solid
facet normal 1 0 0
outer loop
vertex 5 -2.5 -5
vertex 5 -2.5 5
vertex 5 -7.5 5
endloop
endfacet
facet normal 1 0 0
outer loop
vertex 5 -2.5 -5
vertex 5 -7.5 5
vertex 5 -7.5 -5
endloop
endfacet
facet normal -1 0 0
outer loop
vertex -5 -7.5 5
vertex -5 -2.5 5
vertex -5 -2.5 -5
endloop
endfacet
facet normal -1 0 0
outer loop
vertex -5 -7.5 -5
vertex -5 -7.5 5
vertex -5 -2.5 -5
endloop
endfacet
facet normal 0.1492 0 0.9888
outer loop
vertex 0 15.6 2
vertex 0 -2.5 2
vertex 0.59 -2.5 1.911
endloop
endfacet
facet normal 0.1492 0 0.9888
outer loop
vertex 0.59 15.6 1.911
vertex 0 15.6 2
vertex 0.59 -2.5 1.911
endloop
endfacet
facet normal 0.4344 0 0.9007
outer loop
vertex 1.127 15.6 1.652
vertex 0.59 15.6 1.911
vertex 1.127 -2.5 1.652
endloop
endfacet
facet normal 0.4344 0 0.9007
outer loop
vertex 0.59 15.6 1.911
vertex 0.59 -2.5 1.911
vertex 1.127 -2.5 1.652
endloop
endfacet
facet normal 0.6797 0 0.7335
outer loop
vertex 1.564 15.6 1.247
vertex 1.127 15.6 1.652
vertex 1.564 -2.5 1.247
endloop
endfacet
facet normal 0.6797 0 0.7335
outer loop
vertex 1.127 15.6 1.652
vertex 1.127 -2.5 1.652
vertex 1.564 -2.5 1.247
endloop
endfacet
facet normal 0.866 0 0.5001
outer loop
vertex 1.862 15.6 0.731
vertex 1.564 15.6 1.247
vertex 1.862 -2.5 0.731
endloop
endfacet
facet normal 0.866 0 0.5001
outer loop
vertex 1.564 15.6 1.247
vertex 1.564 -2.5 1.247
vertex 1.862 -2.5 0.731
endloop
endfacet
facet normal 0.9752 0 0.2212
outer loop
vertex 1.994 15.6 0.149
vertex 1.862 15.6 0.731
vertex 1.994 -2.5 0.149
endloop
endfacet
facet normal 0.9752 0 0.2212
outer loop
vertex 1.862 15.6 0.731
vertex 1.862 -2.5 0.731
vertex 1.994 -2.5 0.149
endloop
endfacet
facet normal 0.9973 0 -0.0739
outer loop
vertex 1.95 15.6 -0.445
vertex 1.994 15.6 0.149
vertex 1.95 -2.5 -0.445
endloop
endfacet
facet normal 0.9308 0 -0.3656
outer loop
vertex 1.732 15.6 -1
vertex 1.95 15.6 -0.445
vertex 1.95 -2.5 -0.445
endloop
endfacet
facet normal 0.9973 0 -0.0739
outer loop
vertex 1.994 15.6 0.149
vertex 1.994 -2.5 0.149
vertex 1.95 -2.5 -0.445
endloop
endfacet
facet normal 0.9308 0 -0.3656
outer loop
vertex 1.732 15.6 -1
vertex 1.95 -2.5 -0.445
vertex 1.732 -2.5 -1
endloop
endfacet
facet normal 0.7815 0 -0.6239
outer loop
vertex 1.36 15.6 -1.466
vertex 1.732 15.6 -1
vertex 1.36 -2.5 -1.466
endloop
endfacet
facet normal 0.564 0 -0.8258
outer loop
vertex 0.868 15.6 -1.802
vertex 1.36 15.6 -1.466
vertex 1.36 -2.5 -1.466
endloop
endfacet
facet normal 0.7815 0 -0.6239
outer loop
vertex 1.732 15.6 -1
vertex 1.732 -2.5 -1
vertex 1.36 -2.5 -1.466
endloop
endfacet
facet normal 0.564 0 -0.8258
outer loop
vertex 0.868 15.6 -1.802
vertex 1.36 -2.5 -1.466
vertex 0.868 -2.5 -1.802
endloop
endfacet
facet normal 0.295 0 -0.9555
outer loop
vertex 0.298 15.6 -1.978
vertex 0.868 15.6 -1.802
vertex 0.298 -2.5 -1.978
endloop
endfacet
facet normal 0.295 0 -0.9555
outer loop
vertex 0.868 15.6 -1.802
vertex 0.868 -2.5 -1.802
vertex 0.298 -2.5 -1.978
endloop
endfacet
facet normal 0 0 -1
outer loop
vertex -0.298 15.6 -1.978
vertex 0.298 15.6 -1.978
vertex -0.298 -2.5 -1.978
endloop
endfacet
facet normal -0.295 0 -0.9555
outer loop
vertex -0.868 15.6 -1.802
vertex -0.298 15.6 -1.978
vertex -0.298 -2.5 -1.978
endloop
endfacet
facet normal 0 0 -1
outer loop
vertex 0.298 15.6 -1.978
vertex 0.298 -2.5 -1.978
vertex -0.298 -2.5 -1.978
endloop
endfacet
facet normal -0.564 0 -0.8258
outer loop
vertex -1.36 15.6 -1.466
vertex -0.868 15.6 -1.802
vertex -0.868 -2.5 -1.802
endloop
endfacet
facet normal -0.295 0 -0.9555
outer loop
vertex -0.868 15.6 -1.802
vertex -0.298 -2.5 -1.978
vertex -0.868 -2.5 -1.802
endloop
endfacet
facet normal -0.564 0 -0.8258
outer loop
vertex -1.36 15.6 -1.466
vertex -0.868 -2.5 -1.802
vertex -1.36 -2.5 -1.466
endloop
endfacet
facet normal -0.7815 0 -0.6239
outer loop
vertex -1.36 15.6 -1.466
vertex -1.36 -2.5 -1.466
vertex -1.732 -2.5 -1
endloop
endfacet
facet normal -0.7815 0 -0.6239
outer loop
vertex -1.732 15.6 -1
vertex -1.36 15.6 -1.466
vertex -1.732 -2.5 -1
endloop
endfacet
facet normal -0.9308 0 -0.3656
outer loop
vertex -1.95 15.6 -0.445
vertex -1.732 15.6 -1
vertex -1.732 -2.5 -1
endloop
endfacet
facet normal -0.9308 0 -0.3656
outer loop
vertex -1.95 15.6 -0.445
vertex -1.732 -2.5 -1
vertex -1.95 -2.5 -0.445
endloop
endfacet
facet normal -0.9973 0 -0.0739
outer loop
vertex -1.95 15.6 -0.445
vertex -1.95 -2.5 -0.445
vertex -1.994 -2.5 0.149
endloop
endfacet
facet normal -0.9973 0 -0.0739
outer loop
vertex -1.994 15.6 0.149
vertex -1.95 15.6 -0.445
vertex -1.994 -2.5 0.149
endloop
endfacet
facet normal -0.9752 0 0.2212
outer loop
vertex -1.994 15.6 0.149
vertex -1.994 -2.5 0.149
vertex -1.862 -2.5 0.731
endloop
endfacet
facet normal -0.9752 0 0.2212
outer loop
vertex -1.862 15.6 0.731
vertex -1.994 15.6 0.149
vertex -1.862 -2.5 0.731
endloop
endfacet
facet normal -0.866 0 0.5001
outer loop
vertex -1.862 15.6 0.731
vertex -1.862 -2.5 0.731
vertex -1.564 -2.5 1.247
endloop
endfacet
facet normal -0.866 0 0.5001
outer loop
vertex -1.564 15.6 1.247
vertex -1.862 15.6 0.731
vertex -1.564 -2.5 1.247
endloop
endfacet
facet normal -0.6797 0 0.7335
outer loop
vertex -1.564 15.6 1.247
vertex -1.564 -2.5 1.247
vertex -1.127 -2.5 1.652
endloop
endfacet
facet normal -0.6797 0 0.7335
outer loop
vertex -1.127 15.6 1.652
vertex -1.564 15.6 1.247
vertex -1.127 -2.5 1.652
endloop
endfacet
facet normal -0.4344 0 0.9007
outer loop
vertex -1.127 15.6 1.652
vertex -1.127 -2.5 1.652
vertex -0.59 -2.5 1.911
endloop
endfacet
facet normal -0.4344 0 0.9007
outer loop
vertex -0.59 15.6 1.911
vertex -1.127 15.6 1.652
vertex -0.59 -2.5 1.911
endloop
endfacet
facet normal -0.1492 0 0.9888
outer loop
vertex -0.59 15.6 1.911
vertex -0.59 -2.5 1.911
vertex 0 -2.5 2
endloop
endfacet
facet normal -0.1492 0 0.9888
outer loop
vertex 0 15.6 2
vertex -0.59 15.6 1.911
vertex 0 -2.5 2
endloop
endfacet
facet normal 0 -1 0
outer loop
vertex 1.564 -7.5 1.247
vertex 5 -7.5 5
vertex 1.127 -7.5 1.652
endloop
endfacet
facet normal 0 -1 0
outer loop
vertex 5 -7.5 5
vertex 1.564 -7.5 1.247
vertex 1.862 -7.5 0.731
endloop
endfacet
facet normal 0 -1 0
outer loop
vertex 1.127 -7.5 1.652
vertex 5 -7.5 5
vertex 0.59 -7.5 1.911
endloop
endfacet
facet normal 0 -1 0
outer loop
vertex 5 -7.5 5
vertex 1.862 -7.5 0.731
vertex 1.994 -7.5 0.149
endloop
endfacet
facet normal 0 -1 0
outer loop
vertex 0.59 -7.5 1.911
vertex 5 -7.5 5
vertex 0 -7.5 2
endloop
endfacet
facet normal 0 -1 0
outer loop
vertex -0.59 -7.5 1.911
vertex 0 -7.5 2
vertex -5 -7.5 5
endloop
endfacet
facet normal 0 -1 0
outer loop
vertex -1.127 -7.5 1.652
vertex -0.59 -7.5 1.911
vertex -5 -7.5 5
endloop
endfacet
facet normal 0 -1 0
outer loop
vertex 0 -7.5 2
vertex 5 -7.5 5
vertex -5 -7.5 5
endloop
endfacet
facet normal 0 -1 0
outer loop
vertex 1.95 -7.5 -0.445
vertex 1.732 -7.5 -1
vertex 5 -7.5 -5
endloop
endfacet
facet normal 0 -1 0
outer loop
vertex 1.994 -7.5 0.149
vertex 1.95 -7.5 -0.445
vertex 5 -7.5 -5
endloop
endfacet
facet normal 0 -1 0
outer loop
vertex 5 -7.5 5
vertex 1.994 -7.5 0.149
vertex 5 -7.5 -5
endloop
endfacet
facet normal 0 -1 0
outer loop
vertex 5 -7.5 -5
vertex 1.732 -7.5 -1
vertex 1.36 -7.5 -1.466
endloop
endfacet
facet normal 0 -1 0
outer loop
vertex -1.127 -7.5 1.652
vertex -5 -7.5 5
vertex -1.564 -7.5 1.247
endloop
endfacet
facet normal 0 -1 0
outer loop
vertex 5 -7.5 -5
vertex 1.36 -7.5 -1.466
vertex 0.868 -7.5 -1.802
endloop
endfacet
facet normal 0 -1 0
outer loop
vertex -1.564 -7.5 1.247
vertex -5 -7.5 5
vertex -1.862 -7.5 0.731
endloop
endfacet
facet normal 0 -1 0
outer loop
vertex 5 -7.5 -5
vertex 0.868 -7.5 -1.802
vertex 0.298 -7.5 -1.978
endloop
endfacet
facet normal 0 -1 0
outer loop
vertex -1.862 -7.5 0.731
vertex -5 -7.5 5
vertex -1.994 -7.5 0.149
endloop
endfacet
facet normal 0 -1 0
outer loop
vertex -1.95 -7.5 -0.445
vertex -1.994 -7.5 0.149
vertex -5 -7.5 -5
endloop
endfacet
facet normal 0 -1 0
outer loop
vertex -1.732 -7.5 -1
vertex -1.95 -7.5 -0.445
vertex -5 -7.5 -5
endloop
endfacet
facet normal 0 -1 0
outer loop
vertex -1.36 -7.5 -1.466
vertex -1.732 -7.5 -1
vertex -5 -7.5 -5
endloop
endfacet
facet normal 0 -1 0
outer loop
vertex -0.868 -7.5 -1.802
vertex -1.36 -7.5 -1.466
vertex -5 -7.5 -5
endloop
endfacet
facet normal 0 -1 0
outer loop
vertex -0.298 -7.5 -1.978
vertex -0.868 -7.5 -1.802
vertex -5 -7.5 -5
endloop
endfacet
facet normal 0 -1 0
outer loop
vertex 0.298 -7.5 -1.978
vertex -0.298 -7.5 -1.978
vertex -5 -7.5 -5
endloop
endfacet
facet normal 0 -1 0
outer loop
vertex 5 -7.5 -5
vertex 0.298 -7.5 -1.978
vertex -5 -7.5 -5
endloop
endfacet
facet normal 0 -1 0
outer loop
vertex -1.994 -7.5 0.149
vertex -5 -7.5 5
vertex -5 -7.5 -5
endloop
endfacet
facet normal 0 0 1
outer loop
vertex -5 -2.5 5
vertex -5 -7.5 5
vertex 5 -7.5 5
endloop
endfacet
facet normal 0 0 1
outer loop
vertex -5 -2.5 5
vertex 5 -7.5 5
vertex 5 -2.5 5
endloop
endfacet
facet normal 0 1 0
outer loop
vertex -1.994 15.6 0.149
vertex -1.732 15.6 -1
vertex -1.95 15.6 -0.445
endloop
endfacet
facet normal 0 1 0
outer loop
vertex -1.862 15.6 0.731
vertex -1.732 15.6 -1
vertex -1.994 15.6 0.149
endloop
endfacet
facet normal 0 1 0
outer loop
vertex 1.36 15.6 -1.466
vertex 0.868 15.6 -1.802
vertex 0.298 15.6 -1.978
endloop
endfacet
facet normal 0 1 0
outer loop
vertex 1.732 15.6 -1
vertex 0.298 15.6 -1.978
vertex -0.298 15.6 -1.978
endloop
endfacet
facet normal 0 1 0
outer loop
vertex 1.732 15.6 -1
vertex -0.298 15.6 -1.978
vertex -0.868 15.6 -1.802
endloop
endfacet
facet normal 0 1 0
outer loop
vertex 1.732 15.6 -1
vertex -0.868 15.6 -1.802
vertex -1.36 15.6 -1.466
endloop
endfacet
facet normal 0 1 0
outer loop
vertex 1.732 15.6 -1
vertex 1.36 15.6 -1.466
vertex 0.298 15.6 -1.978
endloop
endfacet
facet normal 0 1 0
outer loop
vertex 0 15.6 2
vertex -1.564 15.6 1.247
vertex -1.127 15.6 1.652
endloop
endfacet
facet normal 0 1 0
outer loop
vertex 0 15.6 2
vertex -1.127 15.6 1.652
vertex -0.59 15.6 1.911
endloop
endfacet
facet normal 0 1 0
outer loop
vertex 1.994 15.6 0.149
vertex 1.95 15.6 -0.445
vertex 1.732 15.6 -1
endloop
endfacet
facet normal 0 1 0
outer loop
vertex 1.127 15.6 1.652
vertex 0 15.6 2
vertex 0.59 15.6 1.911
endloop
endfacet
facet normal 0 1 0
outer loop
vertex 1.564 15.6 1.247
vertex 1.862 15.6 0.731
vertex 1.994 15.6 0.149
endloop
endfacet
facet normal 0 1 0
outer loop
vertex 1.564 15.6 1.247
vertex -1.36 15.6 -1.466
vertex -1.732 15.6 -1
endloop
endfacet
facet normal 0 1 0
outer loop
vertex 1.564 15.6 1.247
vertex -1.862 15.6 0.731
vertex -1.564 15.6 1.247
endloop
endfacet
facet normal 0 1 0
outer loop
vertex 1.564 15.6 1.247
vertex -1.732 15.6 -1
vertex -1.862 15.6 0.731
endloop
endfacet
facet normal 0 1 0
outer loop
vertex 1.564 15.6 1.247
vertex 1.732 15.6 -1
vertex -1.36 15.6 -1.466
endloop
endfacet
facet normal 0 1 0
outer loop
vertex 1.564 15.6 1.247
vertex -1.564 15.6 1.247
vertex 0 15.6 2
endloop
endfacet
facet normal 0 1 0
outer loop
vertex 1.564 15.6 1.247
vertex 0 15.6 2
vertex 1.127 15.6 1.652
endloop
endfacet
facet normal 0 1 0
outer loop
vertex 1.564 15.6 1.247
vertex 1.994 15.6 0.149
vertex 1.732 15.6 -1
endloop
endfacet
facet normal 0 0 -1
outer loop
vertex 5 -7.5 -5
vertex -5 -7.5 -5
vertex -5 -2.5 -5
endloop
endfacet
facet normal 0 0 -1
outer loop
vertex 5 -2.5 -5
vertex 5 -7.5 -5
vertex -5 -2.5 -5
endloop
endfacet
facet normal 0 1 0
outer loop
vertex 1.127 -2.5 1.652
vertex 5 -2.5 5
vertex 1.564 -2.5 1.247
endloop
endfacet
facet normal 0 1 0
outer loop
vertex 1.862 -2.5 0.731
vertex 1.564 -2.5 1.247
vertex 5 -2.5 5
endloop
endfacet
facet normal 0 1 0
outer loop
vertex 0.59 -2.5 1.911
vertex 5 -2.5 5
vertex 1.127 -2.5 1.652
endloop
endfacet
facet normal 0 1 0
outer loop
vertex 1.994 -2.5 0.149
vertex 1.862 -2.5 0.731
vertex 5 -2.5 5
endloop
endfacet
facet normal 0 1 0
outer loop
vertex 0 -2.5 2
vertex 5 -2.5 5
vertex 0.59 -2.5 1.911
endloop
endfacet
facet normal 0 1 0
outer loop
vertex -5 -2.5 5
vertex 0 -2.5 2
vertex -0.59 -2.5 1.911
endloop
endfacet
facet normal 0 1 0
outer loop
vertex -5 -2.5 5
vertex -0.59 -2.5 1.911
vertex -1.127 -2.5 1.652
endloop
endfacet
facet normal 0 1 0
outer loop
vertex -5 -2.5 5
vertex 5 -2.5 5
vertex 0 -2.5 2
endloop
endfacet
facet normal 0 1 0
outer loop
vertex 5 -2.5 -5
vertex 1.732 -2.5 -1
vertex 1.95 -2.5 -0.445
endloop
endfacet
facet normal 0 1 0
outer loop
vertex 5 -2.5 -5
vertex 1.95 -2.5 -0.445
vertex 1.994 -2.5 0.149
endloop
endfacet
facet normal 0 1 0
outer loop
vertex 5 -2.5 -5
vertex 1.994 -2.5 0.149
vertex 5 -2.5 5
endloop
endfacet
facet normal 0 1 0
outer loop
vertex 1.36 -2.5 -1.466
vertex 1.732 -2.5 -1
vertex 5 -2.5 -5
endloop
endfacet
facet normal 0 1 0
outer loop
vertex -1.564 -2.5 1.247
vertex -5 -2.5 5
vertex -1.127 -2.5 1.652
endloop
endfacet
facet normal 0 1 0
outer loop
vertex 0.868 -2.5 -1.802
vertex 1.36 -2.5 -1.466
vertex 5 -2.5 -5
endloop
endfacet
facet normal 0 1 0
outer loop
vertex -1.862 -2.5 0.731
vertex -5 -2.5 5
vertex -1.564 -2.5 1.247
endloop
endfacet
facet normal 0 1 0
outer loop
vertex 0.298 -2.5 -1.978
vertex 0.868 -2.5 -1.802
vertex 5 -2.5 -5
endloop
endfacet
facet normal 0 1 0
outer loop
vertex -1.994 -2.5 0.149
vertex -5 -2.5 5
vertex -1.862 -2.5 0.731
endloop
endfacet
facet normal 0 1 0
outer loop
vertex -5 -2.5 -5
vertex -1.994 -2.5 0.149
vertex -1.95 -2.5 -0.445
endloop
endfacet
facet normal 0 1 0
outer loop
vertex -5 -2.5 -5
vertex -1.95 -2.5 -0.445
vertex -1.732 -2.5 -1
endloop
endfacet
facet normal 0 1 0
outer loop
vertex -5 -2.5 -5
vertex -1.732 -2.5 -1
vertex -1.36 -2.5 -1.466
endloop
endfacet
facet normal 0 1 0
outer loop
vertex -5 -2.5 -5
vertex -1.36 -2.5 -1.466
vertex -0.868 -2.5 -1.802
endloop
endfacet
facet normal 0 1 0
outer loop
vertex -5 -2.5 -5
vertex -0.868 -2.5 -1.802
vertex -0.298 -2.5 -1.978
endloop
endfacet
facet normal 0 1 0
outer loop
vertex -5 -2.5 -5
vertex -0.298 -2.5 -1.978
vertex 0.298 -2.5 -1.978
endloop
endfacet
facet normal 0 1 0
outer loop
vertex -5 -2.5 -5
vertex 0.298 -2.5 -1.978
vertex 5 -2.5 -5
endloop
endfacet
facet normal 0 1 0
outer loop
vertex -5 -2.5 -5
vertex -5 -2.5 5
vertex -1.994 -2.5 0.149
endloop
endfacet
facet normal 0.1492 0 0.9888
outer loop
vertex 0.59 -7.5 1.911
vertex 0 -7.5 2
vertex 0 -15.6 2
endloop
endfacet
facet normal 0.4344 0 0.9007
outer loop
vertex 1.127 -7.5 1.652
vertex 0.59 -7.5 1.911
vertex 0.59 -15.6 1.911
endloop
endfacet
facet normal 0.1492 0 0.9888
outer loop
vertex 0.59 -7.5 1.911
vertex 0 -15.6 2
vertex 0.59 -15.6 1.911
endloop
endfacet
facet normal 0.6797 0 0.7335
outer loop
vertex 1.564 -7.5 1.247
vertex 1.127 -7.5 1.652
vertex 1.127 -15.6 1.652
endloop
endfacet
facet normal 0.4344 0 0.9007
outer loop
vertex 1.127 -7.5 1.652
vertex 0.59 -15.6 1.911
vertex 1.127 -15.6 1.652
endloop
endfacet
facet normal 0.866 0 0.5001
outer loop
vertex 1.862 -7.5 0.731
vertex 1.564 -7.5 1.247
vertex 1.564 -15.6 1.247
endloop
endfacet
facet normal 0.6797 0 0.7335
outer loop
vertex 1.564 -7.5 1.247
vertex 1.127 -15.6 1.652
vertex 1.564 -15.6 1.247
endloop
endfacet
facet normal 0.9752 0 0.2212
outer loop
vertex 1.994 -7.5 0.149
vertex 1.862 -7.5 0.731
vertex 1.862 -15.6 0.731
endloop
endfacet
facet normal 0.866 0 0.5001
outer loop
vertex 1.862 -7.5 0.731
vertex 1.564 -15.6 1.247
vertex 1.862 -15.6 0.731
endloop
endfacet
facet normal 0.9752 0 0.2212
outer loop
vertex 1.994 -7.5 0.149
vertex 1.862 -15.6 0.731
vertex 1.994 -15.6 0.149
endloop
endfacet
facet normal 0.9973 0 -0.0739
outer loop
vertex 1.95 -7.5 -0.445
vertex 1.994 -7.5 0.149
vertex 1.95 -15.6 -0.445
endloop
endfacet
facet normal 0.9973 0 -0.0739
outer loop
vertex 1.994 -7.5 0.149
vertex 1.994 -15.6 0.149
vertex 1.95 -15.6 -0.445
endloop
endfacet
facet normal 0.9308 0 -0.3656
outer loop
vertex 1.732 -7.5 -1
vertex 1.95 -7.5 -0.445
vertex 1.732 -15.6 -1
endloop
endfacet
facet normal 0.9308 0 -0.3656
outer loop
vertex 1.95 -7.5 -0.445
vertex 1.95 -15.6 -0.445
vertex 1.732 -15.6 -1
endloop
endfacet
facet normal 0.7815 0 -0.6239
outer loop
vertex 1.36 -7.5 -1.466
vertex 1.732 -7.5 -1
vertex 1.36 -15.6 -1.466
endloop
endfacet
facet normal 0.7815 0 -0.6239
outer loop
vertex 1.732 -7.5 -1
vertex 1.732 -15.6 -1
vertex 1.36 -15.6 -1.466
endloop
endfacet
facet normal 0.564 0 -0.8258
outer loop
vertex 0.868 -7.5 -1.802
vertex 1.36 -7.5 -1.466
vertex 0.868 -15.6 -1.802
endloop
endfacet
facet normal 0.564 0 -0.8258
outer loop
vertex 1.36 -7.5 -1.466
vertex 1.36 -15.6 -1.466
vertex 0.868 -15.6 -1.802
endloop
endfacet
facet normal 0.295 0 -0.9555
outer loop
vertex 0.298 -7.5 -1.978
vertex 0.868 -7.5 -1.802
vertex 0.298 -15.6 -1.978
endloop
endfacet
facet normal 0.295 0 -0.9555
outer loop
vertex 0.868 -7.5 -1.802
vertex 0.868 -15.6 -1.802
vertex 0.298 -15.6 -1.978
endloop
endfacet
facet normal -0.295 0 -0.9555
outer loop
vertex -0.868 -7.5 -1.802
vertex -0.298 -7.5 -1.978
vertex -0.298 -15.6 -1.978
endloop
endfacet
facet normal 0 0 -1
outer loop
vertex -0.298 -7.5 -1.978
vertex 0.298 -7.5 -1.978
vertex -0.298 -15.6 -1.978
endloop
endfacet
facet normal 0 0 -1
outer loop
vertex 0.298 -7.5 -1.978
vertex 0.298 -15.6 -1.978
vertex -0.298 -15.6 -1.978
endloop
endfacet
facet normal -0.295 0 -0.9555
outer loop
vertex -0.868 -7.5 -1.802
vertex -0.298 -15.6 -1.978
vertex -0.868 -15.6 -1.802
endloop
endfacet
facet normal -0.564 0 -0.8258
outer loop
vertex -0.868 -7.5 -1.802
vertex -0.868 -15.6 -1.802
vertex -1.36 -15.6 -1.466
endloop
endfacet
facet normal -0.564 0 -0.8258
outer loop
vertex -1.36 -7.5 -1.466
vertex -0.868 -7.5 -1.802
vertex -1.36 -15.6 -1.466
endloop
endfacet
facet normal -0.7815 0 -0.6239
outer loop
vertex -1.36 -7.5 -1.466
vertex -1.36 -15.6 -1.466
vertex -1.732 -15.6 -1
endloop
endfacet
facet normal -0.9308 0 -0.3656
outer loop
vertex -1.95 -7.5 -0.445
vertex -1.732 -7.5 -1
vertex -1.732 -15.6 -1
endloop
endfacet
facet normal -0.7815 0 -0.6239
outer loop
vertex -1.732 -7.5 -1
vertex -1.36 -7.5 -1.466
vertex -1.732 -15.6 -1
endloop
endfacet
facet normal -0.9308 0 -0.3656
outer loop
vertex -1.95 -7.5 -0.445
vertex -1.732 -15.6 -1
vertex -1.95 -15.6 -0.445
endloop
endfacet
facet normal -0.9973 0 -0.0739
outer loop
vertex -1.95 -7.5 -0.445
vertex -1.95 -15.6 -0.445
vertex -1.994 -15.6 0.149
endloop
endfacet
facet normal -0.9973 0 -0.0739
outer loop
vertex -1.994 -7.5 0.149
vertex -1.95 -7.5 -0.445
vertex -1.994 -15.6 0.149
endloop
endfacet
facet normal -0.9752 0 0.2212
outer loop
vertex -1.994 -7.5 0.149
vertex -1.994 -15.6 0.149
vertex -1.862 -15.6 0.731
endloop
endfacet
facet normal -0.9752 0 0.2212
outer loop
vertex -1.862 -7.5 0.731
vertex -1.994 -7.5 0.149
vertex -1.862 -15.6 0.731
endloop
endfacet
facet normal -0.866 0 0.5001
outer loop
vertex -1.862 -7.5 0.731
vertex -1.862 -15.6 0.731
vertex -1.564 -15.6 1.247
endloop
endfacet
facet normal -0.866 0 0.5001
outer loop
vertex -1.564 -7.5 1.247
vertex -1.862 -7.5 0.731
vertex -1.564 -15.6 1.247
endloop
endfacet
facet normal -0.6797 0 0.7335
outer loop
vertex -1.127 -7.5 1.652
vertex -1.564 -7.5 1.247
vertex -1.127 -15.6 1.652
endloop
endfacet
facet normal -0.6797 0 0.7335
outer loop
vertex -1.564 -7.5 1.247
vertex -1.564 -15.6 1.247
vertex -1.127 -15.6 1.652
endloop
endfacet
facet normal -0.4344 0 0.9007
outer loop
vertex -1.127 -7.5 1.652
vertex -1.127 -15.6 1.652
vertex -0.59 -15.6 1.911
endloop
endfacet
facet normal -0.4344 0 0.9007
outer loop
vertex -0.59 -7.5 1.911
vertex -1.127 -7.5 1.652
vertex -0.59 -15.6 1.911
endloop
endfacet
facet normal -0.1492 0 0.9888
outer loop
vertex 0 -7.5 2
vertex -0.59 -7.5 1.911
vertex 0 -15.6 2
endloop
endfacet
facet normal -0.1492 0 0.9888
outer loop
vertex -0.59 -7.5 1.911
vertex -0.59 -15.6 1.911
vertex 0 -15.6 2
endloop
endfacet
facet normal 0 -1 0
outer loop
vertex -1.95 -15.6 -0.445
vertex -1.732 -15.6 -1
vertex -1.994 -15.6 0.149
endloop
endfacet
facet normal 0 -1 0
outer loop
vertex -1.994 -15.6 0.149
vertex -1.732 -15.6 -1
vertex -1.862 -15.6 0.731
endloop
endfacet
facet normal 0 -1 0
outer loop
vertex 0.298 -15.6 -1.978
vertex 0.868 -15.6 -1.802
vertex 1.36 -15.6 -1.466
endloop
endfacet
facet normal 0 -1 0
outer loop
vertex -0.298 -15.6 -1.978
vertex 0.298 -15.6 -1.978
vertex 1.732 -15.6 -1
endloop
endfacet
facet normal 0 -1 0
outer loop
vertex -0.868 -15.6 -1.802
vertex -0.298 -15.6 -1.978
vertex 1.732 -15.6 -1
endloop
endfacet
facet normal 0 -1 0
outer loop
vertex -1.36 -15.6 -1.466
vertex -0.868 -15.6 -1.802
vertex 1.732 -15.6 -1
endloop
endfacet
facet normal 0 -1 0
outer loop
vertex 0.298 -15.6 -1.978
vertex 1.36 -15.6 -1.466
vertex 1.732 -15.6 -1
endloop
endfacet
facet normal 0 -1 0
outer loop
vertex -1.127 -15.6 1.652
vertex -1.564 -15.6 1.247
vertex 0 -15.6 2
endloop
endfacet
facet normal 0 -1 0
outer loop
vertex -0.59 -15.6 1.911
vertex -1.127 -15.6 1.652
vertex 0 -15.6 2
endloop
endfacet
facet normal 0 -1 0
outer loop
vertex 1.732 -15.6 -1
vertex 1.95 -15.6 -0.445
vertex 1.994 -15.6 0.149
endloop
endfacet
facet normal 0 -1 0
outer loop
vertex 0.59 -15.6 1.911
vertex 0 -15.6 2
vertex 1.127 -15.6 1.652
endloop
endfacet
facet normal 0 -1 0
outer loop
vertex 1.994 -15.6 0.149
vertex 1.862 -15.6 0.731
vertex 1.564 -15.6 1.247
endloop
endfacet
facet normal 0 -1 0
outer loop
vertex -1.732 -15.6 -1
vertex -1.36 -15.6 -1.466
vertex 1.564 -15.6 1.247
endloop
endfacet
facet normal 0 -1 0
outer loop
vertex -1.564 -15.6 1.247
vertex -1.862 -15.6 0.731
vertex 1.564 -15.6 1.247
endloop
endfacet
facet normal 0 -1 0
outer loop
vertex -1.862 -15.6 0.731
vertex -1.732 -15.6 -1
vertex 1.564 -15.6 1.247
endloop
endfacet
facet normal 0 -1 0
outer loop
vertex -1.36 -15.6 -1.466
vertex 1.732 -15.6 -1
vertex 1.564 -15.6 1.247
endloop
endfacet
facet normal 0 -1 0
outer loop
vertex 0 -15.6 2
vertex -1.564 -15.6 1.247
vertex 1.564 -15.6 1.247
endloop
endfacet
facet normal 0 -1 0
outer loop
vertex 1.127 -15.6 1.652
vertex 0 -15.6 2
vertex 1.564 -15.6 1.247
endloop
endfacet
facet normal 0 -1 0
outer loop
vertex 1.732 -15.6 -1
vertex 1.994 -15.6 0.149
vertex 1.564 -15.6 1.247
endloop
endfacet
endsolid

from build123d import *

# Parameters (mm, degrees)
BOSS_EXTRUDE1_DEPTH      = 15.6
BOSS_EXTRUDE1_DEPTH_BACK = 15.6
SKETCH1_R                = 2
BOSS_EXTRUDE2_DEPTH      = 5
BOSS_EXTRUDE2_DEPTH_BACK = 5
SKETCH3_W                = 10
SKETCH3_H                = 5


with BuildPart() as part:
    # Sketch1 → Boss-Extrude1 (new, two sides: drawn at the far end of the back side and taken through both)
    with BuildSketch(Plane(origin=(0, 0, 0), x_dir=(1, 0, 0), z_dir=(0, 1, 0)).offset(-BOSS_EXTRUDE1_DEPTH_BACK)):
        Circle(SKETCH1_R)
    extrude(amount=BOSS_EXTRUDE1_DEPTH + BOSS_EXTRUDE1_DEPTH_BACK)

    # Sketch3 → Boss-Extrude2 (add, two sides: drawn at the far end of the back side and taken through both)
    with BuildSketch(Plane(origin=(0, 0, 0), x_dir=(0, 0, -1), z_dir=(1, 0, 0)).offset(-BOSS_EXTRUDE2_DEPTH_BACK)):
        with Locations((0, -5)):
            Rectangle(SKETCH3_W, SKETCH3_H)
    extrude(amount=BOSS_EXTRUDE2_DEPTH + BOSS_EXTRUDE2_DEPTH_BACK)


solid = part.part
